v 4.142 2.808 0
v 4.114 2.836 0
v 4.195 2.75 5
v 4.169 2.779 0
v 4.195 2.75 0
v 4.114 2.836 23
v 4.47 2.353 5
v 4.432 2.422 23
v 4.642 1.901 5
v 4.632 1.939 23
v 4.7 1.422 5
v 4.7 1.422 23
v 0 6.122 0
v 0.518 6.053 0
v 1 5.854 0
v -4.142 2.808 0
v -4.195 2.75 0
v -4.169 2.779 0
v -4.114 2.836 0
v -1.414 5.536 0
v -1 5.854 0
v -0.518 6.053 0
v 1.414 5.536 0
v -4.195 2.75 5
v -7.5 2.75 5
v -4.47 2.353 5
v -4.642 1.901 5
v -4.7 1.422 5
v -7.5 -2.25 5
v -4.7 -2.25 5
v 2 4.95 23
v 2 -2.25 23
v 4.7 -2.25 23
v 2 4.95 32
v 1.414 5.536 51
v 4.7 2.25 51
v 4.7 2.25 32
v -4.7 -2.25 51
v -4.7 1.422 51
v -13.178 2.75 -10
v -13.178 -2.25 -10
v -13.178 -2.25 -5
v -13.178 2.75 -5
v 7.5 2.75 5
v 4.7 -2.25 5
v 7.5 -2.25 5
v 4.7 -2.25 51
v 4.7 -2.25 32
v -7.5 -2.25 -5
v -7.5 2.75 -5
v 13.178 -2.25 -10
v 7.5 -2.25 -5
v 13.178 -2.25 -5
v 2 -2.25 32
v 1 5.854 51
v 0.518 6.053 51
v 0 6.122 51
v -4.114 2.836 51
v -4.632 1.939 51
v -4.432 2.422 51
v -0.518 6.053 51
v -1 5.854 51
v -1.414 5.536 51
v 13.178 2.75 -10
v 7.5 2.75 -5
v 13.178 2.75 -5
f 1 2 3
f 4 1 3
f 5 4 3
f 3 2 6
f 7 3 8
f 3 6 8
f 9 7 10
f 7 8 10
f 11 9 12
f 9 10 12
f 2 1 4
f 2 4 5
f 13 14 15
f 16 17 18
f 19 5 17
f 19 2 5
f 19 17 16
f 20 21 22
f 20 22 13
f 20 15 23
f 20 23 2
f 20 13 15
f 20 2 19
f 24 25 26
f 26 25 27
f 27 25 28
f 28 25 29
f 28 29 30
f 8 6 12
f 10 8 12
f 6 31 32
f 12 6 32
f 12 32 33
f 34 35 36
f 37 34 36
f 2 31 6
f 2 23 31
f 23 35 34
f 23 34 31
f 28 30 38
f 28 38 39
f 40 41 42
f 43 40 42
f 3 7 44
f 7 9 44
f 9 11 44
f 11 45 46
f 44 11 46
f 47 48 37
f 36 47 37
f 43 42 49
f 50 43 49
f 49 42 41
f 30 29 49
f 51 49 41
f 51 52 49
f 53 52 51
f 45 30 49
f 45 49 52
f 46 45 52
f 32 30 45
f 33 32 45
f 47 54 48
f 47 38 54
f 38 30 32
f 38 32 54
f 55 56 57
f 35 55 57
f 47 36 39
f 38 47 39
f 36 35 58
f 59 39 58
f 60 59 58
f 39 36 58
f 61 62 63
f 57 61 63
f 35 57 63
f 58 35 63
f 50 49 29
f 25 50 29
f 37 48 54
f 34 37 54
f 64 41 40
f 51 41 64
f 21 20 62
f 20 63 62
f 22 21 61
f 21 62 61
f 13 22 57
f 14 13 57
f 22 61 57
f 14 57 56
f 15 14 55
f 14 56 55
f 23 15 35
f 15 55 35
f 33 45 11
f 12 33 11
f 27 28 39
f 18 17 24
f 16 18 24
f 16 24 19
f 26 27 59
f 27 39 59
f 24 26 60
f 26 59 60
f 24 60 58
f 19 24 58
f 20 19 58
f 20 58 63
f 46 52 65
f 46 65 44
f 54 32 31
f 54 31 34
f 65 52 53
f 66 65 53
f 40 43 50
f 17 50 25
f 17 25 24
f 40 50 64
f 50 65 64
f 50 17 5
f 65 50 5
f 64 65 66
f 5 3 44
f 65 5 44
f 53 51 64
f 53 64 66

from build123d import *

# Parameters (mm, degrees)
SZKIC1_W                    = 9.4
SZKIC1_H                    = 4.5
DODANIE_WYCI_GNI_CIE1_DEPTH = 51
SZKIC2_W                    = 2.7
SZKIC2_H                    = 9
SZKIC2_W_2                  = 5.3
WYTNIJ_WYCI_GNI_CIE1_DEPTH  = 10
SZKIC4_W                    = 15
SZKIC4_H                    = 10
SZKIC4_W_2                  = 26.356233294
SZKIC4_H_2                  = 5
DODANIE_WYCI_GNI_CIE2_DEPTH = 5
ZAOKR_GLENIE1_R             = 2


with BuildPart() as part:
    # Szkic1 → Dodanie-wyciągnięcie1 (new body)
    with BuildSketch(Plane.XY):
        Polygon((0, 6.95), (4.7, 2.25), (-4.7, 2.25), align=None)
        Rectangle(SZKIC1_W, SZKIC1_H)
    extrude(amount=DODANIE_WYCI_GNI_CIE1_DEPTH)

    # Szkic2 → Wytnij-wyciągnięcie1 (cut)
    with BuildSketch(Plane.XZ.offset(2.25)):
        with Locations((3.35, 27.5)):
            Rectangle(SZKIC2_W, SZKIC2_H)
        with Locations((7.35, 27.5)):
            Rectangle(SZKIC2_W_2, SZKIC2_H)
    extrude(amount=-WYTNIJ_WYCI_GNI_CIE1_DEPTH, mode=Mode.SUBTRACT)

    # Szkic4 → Dodanie-wyciągnięcie2 (add)
    with BuildSketch(Plane.XZ.offset(2.25)):
        Rectangle(SZKIC4_W, SZKIC4_H)
        with Locations((0, -7.5)):
            Rectangle(SZKIC4_W_2, SZKIC4_H_2)
    extrude(amount=-DODANIE_WYCI_GNI_CIE2_DEPTH)

    # Zaokrąglenie1
    zaokr_glenie1_edges = [part.edges().sort_by_distance(p)[0] for p in [
        (4.7, 2.25, 14),
        (-4.7, 2.25, 28),
        (0, 6.95, 25.5),
    ]]
    fillet(zaokr_glenie1_edges, radius=ZAOKR_GLENIE1_R)


solid = part.part
